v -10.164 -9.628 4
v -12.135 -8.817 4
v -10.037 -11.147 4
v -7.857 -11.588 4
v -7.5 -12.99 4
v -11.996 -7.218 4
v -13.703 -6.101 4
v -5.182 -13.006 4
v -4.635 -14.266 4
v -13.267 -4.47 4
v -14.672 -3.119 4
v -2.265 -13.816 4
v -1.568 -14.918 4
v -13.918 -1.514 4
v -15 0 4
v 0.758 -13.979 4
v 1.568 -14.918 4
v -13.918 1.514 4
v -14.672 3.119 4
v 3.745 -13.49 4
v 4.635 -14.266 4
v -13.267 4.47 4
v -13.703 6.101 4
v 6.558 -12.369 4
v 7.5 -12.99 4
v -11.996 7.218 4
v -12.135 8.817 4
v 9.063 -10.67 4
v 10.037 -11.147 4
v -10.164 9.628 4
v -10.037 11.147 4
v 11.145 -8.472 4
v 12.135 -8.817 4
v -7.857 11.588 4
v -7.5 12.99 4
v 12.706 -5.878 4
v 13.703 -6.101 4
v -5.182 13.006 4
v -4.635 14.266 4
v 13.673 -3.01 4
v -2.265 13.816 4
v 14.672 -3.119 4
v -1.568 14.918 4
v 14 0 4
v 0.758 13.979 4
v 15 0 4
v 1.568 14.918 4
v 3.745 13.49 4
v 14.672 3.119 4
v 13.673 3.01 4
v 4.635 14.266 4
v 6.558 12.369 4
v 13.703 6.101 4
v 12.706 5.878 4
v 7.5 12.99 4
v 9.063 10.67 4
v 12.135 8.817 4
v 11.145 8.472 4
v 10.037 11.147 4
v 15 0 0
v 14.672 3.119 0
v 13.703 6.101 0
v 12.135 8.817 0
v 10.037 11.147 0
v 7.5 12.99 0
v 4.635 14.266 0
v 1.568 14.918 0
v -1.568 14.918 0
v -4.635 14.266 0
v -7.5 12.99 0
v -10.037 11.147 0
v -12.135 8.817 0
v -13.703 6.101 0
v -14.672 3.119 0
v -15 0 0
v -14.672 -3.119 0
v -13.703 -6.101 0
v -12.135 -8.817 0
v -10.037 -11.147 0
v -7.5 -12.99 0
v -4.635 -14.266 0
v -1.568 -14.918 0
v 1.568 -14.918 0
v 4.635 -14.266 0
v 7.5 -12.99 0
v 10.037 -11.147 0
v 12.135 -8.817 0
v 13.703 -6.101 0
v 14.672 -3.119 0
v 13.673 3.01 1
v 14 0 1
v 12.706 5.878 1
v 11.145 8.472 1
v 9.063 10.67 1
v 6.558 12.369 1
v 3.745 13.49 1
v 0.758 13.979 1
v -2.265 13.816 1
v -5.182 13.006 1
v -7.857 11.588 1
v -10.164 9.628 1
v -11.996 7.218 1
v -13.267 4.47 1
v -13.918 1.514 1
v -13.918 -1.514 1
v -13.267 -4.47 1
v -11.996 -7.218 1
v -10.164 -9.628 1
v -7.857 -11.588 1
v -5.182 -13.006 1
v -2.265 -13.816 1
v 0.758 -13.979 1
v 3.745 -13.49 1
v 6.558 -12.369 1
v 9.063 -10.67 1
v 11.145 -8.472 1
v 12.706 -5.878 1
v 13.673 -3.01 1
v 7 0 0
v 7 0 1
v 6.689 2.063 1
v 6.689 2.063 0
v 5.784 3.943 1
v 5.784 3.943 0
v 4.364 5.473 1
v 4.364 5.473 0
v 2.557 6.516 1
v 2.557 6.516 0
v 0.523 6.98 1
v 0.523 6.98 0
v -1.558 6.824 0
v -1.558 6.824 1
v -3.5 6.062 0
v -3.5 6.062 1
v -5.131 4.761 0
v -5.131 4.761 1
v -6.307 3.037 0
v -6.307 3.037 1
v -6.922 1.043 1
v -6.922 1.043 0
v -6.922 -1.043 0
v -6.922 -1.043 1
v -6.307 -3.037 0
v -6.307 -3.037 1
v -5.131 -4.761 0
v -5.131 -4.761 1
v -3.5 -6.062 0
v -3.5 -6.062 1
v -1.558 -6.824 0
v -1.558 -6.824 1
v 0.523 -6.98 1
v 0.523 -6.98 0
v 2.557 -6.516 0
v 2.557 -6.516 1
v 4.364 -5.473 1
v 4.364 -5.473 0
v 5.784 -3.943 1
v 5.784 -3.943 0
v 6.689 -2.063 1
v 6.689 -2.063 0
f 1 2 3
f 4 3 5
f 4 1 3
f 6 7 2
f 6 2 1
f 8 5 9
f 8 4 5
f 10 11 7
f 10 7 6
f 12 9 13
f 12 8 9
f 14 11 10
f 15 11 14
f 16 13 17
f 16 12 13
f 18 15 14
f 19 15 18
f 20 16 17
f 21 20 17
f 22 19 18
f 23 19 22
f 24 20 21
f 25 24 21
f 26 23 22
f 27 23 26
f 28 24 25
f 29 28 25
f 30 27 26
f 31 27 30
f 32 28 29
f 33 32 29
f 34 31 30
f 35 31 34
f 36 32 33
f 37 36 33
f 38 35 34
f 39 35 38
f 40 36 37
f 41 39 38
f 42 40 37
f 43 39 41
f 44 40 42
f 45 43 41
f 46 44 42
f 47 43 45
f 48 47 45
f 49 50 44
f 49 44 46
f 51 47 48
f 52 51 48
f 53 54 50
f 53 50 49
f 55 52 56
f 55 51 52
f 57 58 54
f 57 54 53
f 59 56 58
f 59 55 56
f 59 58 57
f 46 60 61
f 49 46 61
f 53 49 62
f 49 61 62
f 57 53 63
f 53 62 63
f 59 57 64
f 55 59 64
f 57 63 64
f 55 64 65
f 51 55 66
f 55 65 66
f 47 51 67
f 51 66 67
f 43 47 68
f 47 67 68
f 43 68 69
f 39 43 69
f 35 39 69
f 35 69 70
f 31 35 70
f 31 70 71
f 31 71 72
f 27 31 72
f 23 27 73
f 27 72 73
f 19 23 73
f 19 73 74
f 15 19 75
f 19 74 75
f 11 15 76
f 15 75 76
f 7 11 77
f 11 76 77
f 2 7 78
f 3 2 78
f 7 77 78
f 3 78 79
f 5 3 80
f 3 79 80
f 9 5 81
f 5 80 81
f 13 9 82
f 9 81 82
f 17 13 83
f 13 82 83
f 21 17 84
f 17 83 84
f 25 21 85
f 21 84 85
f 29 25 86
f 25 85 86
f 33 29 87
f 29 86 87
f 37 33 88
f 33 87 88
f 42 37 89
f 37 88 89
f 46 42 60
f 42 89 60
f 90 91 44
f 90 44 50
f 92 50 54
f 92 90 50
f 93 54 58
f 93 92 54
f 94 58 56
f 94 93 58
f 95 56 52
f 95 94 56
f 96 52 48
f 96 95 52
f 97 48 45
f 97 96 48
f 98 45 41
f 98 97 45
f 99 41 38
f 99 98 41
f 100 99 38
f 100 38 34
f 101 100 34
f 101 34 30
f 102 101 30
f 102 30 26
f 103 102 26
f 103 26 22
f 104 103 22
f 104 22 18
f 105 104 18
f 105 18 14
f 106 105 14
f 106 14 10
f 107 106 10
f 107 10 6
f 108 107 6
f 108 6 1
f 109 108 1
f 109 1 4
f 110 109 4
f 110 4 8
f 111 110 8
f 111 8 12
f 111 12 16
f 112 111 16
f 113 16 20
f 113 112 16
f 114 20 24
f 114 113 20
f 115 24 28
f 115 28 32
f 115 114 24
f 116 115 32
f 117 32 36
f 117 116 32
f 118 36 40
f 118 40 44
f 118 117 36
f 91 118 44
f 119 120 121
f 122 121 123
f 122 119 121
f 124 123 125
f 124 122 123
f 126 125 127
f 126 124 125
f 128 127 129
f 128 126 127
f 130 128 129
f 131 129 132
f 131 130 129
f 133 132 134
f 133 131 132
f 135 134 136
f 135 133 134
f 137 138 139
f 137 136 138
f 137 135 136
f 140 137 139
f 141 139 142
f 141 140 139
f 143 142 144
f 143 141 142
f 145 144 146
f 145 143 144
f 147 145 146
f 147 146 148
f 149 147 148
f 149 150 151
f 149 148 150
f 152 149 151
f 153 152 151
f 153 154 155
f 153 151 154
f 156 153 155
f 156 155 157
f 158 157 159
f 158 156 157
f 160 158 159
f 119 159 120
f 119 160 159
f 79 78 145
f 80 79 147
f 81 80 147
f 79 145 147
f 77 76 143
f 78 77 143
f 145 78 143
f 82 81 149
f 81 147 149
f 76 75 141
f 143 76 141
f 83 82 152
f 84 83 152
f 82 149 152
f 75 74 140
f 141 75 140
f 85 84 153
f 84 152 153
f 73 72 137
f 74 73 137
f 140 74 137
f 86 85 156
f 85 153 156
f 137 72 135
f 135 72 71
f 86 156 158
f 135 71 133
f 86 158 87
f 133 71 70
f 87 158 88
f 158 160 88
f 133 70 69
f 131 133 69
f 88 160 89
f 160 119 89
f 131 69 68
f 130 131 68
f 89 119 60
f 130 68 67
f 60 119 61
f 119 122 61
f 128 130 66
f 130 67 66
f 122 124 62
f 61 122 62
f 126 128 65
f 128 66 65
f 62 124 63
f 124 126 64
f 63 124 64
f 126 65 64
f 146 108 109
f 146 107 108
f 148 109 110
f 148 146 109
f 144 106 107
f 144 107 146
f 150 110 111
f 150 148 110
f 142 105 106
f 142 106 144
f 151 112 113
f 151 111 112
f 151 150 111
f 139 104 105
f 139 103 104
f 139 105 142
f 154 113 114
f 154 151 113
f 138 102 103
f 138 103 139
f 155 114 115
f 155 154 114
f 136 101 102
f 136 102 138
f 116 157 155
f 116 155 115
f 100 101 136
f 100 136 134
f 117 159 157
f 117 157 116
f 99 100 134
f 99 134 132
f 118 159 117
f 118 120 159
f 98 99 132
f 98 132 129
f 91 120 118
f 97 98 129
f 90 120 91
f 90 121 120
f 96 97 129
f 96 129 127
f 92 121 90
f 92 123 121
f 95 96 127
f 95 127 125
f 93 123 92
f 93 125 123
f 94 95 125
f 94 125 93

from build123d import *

# Parameters (mm, degrees)
F0_R     = 15
F1_DEPTH = 4
F2_T     = -1
F3_R     = 7
F4_DEPTH = 1.1


with BuildPart() as f1:
    # F0 (on Top) → F1 (new body)
    with BuildSketch(Plane.XY):
        Circle(F0_R)
    extrude(amount=F1_DEPTH)

    # F2
    f2_openings = [f1.faces().sort_by_distance(p)[0] for p in [
        (0, 0, 4),
    ]]
    offset(amount=F2_T, openings=f2_openings)

    # F3 (on Top) → F4 (cut)
    with BuildSketch(Plane.XY):
        Circle(F3_R)
    extrude(amount=F4_DEPTH, mode=Mode.SUBTRACT)


solid = f1.part
